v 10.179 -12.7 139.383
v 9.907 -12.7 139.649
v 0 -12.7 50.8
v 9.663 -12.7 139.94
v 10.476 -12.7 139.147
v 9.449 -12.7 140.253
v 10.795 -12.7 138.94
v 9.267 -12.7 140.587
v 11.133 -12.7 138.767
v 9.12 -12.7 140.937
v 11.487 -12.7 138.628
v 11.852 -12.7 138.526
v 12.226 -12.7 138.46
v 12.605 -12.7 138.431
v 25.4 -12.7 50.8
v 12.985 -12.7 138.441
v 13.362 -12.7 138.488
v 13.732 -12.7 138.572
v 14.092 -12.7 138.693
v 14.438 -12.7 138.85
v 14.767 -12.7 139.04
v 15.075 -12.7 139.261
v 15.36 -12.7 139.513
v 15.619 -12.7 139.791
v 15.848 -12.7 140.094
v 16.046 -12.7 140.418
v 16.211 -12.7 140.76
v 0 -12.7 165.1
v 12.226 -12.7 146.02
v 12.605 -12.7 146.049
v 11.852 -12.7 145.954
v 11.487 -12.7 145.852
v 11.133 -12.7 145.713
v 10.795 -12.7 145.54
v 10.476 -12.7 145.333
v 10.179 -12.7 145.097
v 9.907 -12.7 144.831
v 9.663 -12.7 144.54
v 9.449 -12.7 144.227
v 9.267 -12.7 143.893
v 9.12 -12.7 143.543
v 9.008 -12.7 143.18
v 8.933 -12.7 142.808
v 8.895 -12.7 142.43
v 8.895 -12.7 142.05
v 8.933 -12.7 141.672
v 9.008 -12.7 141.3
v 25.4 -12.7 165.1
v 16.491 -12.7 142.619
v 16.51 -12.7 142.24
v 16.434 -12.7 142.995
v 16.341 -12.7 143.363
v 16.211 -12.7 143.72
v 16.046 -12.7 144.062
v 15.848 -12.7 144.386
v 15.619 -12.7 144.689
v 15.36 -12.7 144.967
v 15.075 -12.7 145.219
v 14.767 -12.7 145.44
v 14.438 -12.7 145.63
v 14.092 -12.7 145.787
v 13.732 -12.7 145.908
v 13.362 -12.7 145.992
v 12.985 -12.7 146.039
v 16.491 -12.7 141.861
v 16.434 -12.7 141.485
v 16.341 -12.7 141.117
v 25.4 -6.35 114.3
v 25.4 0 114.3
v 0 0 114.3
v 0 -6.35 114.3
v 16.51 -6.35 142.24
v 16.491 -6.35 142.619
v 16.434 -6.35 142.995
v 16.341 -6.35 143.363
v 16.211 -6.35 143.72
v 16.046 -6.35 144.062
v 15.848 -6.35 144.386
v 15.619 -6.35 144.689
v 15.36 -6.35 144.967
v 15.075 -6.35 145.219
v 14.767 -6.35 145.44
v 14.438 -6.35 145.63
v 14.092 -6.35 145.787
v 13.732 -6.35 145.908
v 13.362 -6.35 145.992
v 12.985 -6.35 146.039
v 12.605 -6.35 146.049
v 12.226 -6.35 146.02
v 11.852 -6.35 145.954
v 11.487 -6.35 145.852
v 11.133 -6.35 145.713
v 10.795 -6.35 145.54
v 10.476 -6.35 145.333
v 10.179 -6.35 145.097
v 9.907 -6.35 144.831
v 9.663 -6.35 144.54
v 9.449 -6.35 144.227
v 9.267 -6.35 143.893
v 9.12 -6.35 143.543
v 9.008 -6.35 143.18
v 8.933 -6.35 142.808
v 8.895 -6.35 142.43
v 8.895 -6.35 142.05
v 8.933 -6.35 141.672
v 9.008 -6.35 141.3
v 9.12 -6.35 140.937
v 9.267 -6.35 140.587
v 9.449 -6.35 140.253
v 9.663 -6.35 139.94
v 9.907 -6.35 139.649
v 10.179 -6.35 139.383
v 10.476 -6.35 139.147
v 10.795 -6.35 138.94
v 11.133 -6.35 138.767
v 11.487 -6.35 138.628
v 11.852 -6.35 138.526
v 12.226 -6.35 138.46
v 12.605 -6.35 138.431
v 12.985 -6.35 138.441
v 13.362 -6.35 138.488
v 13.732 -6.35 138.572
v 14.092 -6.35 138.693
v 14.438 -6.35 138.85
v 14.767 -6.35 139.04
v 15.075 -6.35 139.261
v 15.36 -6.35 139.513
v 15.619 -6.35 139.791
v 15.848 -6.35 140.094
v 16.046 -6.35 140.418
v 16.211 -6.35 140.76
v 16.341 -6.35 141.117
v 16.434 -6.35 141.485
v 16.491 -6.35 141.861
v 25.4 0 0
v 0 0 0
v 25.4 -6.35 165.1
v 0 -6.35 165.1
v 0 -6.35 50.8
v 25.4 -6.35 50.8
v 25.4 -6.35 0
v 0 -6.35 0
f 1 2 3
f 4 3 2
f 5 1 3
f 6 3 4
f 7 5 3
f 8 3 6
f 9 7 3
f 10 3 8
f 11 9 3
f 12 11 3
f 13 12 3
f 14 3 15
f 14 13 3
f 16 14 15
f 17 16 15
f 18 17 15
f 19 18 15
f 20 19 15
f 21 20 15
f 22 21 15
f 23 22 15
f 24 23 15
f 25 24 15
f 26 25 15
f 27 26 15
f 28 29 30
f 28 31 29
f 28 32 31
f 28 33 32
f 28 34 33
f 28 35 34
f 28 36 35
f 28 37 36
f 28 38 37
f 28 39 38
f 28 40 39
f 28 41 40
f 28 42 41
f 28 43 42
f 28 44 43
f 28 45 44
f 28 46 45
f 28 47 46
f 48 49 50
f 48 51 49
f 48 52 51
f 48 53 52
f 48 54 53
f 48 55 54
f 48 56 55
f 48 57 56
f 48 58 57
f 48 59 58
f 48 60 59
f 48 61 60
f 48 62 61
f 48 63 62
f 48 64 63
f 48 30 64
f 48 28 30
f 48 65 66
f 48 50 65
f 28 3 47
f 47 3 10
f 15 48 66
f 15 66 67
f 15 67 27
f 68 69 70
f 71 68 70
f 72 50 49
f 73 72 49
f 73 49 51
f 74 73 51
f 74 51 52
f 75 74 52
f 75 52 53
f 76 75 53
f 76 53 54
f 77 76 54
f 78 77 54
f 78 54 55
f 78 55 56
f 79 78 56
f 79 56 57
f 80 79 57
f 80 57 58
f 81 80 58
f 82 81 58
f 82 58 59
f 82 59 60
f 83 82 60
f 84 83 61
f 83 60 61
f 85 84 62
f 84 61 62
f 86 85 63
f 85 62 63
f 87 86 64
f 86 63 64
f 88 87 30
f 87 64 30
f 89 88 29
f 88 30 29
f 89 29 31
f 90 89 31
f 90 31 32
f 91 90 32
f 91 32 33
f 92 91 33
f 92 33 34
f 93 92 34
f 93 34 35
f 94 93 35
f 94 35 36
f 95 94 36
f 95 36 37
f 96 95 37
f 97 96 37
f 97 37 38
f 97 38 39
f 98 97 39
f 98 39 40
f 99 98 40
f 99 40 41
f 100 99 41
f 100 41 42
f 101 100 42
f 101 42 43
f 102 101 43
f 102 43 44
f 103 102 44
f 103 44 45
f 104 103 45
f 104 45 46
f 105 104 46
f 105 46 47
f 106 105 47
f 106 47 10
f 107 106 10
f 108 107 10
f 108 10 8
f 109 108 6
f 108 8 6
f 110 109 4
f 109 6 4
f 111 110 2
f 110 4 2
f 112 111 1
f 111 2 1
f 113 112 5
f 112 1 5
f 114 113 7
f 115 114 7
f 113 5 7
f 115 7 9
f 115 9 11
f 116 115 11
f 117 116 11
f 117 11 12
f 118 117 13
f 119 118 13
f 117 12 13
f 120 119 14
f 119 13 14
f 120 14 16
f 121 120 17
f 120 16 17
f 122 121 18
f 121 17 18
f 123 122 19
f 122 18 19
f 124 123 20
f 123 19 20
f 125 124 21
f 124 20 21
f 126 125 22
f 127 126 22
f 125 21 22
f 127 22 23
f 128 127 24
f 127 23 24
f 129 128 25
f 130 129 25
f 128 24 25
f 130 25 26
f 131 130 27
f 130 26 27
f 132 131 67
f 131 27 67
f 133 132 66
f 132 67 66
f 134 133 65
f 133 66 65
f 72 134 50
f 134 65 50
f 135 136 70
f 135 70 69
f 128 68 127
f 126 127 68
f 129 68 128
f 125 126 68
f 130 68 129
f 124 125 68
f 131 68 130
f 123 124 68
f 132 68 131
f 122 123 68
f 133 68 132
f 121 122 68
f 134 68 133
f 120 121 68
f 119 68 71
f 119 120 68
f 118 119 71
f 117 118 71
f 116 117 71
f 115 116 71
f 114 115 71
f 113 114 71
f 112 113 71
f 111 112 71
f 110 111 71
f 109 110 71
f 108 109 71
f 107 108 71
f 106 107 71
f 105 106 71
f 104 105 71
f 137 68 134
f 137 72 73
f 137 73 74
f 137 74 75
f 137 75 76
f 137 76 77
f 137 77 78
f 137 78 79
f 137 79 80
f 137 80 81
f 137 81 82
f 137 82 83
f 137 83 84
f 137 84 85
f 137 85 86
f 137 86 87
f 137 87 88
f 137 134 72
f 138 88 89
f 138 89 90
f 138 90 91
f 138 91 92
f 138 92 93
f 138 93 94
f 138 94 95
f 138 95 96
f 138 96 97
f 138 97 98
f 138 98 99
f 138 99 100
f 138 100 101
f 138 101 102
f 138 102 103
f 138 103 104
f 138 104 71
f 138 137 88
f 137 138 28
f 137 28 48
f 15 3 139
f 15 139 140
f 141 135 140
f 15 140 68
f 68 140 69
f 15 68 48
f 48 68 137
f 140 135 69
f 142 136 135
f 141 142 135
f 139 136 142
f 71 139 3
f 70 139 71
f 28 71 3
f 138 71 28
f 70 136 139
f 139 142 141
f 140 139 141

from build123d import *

# Parameters (mm, degrees)
F0_W     = 25.4
F0_H     = 165.1
F1_DEPTH = 12.7
F2_W     = 25.4
F2_H     = 50.8
F3_DEPTH = 6.35
F4_DEPTH = 6.35
F5_W     = 25.4
F5_H     = 50.8
F6_DEPTH = 6.35
F7_R     = 3.81
F8_DEPTH = 25.4


with BuildPart() as f1:
    # F0 (on Front) → F1 (new body)
    with BuildSketch(Plane.XZ):
        with Locations((12.7, 82.55)):
            Rectangle(F0_W, F0_H)
    extrude(amount=F1_DEPTH)

    # F2 (on face) → F3 (join)
    with BuildSketch(Plane.XZ.offset(12.7)):
        with Locations((12.7, 25.4)):
            Rectangle(F2_W, F2_H)
    extrude(amount=-F3_DEPTH)

    # F2 (on face) → F4 (cut)
    with BuildSketch(Plane.XZ.offset(12.7)):
        with Locations((12.7, 25.4)):
            Rectangle(F2_W, F2_H)
    extrude(amount=-F4_DEPTH, mode=Mode.SUBTRACT)

    # F5 (on face) → F6 (cut)
    with BuildSketch(Plane(origin=(0, 0, 0), x_dir=(-1, 0, 0), z_dir=(0, 1, 0))):
        with Locations((-12.7, 139.7)):
            Rectangle(F5_W, F5_H)
    extrude(amount=-F6_DEPTH, mode=Mode.SUBTRACT)

    # F7 (on face) → F8 (cut)
    with BuildSketch(Plane.XZ.offset(12.7)):
        with Locations((12.7, 142.24)):
            Circle(F7_R)
    extrude(amount=-F8_DEPTH, mode=Mode.SUBTRACT)


solid = f1.part
